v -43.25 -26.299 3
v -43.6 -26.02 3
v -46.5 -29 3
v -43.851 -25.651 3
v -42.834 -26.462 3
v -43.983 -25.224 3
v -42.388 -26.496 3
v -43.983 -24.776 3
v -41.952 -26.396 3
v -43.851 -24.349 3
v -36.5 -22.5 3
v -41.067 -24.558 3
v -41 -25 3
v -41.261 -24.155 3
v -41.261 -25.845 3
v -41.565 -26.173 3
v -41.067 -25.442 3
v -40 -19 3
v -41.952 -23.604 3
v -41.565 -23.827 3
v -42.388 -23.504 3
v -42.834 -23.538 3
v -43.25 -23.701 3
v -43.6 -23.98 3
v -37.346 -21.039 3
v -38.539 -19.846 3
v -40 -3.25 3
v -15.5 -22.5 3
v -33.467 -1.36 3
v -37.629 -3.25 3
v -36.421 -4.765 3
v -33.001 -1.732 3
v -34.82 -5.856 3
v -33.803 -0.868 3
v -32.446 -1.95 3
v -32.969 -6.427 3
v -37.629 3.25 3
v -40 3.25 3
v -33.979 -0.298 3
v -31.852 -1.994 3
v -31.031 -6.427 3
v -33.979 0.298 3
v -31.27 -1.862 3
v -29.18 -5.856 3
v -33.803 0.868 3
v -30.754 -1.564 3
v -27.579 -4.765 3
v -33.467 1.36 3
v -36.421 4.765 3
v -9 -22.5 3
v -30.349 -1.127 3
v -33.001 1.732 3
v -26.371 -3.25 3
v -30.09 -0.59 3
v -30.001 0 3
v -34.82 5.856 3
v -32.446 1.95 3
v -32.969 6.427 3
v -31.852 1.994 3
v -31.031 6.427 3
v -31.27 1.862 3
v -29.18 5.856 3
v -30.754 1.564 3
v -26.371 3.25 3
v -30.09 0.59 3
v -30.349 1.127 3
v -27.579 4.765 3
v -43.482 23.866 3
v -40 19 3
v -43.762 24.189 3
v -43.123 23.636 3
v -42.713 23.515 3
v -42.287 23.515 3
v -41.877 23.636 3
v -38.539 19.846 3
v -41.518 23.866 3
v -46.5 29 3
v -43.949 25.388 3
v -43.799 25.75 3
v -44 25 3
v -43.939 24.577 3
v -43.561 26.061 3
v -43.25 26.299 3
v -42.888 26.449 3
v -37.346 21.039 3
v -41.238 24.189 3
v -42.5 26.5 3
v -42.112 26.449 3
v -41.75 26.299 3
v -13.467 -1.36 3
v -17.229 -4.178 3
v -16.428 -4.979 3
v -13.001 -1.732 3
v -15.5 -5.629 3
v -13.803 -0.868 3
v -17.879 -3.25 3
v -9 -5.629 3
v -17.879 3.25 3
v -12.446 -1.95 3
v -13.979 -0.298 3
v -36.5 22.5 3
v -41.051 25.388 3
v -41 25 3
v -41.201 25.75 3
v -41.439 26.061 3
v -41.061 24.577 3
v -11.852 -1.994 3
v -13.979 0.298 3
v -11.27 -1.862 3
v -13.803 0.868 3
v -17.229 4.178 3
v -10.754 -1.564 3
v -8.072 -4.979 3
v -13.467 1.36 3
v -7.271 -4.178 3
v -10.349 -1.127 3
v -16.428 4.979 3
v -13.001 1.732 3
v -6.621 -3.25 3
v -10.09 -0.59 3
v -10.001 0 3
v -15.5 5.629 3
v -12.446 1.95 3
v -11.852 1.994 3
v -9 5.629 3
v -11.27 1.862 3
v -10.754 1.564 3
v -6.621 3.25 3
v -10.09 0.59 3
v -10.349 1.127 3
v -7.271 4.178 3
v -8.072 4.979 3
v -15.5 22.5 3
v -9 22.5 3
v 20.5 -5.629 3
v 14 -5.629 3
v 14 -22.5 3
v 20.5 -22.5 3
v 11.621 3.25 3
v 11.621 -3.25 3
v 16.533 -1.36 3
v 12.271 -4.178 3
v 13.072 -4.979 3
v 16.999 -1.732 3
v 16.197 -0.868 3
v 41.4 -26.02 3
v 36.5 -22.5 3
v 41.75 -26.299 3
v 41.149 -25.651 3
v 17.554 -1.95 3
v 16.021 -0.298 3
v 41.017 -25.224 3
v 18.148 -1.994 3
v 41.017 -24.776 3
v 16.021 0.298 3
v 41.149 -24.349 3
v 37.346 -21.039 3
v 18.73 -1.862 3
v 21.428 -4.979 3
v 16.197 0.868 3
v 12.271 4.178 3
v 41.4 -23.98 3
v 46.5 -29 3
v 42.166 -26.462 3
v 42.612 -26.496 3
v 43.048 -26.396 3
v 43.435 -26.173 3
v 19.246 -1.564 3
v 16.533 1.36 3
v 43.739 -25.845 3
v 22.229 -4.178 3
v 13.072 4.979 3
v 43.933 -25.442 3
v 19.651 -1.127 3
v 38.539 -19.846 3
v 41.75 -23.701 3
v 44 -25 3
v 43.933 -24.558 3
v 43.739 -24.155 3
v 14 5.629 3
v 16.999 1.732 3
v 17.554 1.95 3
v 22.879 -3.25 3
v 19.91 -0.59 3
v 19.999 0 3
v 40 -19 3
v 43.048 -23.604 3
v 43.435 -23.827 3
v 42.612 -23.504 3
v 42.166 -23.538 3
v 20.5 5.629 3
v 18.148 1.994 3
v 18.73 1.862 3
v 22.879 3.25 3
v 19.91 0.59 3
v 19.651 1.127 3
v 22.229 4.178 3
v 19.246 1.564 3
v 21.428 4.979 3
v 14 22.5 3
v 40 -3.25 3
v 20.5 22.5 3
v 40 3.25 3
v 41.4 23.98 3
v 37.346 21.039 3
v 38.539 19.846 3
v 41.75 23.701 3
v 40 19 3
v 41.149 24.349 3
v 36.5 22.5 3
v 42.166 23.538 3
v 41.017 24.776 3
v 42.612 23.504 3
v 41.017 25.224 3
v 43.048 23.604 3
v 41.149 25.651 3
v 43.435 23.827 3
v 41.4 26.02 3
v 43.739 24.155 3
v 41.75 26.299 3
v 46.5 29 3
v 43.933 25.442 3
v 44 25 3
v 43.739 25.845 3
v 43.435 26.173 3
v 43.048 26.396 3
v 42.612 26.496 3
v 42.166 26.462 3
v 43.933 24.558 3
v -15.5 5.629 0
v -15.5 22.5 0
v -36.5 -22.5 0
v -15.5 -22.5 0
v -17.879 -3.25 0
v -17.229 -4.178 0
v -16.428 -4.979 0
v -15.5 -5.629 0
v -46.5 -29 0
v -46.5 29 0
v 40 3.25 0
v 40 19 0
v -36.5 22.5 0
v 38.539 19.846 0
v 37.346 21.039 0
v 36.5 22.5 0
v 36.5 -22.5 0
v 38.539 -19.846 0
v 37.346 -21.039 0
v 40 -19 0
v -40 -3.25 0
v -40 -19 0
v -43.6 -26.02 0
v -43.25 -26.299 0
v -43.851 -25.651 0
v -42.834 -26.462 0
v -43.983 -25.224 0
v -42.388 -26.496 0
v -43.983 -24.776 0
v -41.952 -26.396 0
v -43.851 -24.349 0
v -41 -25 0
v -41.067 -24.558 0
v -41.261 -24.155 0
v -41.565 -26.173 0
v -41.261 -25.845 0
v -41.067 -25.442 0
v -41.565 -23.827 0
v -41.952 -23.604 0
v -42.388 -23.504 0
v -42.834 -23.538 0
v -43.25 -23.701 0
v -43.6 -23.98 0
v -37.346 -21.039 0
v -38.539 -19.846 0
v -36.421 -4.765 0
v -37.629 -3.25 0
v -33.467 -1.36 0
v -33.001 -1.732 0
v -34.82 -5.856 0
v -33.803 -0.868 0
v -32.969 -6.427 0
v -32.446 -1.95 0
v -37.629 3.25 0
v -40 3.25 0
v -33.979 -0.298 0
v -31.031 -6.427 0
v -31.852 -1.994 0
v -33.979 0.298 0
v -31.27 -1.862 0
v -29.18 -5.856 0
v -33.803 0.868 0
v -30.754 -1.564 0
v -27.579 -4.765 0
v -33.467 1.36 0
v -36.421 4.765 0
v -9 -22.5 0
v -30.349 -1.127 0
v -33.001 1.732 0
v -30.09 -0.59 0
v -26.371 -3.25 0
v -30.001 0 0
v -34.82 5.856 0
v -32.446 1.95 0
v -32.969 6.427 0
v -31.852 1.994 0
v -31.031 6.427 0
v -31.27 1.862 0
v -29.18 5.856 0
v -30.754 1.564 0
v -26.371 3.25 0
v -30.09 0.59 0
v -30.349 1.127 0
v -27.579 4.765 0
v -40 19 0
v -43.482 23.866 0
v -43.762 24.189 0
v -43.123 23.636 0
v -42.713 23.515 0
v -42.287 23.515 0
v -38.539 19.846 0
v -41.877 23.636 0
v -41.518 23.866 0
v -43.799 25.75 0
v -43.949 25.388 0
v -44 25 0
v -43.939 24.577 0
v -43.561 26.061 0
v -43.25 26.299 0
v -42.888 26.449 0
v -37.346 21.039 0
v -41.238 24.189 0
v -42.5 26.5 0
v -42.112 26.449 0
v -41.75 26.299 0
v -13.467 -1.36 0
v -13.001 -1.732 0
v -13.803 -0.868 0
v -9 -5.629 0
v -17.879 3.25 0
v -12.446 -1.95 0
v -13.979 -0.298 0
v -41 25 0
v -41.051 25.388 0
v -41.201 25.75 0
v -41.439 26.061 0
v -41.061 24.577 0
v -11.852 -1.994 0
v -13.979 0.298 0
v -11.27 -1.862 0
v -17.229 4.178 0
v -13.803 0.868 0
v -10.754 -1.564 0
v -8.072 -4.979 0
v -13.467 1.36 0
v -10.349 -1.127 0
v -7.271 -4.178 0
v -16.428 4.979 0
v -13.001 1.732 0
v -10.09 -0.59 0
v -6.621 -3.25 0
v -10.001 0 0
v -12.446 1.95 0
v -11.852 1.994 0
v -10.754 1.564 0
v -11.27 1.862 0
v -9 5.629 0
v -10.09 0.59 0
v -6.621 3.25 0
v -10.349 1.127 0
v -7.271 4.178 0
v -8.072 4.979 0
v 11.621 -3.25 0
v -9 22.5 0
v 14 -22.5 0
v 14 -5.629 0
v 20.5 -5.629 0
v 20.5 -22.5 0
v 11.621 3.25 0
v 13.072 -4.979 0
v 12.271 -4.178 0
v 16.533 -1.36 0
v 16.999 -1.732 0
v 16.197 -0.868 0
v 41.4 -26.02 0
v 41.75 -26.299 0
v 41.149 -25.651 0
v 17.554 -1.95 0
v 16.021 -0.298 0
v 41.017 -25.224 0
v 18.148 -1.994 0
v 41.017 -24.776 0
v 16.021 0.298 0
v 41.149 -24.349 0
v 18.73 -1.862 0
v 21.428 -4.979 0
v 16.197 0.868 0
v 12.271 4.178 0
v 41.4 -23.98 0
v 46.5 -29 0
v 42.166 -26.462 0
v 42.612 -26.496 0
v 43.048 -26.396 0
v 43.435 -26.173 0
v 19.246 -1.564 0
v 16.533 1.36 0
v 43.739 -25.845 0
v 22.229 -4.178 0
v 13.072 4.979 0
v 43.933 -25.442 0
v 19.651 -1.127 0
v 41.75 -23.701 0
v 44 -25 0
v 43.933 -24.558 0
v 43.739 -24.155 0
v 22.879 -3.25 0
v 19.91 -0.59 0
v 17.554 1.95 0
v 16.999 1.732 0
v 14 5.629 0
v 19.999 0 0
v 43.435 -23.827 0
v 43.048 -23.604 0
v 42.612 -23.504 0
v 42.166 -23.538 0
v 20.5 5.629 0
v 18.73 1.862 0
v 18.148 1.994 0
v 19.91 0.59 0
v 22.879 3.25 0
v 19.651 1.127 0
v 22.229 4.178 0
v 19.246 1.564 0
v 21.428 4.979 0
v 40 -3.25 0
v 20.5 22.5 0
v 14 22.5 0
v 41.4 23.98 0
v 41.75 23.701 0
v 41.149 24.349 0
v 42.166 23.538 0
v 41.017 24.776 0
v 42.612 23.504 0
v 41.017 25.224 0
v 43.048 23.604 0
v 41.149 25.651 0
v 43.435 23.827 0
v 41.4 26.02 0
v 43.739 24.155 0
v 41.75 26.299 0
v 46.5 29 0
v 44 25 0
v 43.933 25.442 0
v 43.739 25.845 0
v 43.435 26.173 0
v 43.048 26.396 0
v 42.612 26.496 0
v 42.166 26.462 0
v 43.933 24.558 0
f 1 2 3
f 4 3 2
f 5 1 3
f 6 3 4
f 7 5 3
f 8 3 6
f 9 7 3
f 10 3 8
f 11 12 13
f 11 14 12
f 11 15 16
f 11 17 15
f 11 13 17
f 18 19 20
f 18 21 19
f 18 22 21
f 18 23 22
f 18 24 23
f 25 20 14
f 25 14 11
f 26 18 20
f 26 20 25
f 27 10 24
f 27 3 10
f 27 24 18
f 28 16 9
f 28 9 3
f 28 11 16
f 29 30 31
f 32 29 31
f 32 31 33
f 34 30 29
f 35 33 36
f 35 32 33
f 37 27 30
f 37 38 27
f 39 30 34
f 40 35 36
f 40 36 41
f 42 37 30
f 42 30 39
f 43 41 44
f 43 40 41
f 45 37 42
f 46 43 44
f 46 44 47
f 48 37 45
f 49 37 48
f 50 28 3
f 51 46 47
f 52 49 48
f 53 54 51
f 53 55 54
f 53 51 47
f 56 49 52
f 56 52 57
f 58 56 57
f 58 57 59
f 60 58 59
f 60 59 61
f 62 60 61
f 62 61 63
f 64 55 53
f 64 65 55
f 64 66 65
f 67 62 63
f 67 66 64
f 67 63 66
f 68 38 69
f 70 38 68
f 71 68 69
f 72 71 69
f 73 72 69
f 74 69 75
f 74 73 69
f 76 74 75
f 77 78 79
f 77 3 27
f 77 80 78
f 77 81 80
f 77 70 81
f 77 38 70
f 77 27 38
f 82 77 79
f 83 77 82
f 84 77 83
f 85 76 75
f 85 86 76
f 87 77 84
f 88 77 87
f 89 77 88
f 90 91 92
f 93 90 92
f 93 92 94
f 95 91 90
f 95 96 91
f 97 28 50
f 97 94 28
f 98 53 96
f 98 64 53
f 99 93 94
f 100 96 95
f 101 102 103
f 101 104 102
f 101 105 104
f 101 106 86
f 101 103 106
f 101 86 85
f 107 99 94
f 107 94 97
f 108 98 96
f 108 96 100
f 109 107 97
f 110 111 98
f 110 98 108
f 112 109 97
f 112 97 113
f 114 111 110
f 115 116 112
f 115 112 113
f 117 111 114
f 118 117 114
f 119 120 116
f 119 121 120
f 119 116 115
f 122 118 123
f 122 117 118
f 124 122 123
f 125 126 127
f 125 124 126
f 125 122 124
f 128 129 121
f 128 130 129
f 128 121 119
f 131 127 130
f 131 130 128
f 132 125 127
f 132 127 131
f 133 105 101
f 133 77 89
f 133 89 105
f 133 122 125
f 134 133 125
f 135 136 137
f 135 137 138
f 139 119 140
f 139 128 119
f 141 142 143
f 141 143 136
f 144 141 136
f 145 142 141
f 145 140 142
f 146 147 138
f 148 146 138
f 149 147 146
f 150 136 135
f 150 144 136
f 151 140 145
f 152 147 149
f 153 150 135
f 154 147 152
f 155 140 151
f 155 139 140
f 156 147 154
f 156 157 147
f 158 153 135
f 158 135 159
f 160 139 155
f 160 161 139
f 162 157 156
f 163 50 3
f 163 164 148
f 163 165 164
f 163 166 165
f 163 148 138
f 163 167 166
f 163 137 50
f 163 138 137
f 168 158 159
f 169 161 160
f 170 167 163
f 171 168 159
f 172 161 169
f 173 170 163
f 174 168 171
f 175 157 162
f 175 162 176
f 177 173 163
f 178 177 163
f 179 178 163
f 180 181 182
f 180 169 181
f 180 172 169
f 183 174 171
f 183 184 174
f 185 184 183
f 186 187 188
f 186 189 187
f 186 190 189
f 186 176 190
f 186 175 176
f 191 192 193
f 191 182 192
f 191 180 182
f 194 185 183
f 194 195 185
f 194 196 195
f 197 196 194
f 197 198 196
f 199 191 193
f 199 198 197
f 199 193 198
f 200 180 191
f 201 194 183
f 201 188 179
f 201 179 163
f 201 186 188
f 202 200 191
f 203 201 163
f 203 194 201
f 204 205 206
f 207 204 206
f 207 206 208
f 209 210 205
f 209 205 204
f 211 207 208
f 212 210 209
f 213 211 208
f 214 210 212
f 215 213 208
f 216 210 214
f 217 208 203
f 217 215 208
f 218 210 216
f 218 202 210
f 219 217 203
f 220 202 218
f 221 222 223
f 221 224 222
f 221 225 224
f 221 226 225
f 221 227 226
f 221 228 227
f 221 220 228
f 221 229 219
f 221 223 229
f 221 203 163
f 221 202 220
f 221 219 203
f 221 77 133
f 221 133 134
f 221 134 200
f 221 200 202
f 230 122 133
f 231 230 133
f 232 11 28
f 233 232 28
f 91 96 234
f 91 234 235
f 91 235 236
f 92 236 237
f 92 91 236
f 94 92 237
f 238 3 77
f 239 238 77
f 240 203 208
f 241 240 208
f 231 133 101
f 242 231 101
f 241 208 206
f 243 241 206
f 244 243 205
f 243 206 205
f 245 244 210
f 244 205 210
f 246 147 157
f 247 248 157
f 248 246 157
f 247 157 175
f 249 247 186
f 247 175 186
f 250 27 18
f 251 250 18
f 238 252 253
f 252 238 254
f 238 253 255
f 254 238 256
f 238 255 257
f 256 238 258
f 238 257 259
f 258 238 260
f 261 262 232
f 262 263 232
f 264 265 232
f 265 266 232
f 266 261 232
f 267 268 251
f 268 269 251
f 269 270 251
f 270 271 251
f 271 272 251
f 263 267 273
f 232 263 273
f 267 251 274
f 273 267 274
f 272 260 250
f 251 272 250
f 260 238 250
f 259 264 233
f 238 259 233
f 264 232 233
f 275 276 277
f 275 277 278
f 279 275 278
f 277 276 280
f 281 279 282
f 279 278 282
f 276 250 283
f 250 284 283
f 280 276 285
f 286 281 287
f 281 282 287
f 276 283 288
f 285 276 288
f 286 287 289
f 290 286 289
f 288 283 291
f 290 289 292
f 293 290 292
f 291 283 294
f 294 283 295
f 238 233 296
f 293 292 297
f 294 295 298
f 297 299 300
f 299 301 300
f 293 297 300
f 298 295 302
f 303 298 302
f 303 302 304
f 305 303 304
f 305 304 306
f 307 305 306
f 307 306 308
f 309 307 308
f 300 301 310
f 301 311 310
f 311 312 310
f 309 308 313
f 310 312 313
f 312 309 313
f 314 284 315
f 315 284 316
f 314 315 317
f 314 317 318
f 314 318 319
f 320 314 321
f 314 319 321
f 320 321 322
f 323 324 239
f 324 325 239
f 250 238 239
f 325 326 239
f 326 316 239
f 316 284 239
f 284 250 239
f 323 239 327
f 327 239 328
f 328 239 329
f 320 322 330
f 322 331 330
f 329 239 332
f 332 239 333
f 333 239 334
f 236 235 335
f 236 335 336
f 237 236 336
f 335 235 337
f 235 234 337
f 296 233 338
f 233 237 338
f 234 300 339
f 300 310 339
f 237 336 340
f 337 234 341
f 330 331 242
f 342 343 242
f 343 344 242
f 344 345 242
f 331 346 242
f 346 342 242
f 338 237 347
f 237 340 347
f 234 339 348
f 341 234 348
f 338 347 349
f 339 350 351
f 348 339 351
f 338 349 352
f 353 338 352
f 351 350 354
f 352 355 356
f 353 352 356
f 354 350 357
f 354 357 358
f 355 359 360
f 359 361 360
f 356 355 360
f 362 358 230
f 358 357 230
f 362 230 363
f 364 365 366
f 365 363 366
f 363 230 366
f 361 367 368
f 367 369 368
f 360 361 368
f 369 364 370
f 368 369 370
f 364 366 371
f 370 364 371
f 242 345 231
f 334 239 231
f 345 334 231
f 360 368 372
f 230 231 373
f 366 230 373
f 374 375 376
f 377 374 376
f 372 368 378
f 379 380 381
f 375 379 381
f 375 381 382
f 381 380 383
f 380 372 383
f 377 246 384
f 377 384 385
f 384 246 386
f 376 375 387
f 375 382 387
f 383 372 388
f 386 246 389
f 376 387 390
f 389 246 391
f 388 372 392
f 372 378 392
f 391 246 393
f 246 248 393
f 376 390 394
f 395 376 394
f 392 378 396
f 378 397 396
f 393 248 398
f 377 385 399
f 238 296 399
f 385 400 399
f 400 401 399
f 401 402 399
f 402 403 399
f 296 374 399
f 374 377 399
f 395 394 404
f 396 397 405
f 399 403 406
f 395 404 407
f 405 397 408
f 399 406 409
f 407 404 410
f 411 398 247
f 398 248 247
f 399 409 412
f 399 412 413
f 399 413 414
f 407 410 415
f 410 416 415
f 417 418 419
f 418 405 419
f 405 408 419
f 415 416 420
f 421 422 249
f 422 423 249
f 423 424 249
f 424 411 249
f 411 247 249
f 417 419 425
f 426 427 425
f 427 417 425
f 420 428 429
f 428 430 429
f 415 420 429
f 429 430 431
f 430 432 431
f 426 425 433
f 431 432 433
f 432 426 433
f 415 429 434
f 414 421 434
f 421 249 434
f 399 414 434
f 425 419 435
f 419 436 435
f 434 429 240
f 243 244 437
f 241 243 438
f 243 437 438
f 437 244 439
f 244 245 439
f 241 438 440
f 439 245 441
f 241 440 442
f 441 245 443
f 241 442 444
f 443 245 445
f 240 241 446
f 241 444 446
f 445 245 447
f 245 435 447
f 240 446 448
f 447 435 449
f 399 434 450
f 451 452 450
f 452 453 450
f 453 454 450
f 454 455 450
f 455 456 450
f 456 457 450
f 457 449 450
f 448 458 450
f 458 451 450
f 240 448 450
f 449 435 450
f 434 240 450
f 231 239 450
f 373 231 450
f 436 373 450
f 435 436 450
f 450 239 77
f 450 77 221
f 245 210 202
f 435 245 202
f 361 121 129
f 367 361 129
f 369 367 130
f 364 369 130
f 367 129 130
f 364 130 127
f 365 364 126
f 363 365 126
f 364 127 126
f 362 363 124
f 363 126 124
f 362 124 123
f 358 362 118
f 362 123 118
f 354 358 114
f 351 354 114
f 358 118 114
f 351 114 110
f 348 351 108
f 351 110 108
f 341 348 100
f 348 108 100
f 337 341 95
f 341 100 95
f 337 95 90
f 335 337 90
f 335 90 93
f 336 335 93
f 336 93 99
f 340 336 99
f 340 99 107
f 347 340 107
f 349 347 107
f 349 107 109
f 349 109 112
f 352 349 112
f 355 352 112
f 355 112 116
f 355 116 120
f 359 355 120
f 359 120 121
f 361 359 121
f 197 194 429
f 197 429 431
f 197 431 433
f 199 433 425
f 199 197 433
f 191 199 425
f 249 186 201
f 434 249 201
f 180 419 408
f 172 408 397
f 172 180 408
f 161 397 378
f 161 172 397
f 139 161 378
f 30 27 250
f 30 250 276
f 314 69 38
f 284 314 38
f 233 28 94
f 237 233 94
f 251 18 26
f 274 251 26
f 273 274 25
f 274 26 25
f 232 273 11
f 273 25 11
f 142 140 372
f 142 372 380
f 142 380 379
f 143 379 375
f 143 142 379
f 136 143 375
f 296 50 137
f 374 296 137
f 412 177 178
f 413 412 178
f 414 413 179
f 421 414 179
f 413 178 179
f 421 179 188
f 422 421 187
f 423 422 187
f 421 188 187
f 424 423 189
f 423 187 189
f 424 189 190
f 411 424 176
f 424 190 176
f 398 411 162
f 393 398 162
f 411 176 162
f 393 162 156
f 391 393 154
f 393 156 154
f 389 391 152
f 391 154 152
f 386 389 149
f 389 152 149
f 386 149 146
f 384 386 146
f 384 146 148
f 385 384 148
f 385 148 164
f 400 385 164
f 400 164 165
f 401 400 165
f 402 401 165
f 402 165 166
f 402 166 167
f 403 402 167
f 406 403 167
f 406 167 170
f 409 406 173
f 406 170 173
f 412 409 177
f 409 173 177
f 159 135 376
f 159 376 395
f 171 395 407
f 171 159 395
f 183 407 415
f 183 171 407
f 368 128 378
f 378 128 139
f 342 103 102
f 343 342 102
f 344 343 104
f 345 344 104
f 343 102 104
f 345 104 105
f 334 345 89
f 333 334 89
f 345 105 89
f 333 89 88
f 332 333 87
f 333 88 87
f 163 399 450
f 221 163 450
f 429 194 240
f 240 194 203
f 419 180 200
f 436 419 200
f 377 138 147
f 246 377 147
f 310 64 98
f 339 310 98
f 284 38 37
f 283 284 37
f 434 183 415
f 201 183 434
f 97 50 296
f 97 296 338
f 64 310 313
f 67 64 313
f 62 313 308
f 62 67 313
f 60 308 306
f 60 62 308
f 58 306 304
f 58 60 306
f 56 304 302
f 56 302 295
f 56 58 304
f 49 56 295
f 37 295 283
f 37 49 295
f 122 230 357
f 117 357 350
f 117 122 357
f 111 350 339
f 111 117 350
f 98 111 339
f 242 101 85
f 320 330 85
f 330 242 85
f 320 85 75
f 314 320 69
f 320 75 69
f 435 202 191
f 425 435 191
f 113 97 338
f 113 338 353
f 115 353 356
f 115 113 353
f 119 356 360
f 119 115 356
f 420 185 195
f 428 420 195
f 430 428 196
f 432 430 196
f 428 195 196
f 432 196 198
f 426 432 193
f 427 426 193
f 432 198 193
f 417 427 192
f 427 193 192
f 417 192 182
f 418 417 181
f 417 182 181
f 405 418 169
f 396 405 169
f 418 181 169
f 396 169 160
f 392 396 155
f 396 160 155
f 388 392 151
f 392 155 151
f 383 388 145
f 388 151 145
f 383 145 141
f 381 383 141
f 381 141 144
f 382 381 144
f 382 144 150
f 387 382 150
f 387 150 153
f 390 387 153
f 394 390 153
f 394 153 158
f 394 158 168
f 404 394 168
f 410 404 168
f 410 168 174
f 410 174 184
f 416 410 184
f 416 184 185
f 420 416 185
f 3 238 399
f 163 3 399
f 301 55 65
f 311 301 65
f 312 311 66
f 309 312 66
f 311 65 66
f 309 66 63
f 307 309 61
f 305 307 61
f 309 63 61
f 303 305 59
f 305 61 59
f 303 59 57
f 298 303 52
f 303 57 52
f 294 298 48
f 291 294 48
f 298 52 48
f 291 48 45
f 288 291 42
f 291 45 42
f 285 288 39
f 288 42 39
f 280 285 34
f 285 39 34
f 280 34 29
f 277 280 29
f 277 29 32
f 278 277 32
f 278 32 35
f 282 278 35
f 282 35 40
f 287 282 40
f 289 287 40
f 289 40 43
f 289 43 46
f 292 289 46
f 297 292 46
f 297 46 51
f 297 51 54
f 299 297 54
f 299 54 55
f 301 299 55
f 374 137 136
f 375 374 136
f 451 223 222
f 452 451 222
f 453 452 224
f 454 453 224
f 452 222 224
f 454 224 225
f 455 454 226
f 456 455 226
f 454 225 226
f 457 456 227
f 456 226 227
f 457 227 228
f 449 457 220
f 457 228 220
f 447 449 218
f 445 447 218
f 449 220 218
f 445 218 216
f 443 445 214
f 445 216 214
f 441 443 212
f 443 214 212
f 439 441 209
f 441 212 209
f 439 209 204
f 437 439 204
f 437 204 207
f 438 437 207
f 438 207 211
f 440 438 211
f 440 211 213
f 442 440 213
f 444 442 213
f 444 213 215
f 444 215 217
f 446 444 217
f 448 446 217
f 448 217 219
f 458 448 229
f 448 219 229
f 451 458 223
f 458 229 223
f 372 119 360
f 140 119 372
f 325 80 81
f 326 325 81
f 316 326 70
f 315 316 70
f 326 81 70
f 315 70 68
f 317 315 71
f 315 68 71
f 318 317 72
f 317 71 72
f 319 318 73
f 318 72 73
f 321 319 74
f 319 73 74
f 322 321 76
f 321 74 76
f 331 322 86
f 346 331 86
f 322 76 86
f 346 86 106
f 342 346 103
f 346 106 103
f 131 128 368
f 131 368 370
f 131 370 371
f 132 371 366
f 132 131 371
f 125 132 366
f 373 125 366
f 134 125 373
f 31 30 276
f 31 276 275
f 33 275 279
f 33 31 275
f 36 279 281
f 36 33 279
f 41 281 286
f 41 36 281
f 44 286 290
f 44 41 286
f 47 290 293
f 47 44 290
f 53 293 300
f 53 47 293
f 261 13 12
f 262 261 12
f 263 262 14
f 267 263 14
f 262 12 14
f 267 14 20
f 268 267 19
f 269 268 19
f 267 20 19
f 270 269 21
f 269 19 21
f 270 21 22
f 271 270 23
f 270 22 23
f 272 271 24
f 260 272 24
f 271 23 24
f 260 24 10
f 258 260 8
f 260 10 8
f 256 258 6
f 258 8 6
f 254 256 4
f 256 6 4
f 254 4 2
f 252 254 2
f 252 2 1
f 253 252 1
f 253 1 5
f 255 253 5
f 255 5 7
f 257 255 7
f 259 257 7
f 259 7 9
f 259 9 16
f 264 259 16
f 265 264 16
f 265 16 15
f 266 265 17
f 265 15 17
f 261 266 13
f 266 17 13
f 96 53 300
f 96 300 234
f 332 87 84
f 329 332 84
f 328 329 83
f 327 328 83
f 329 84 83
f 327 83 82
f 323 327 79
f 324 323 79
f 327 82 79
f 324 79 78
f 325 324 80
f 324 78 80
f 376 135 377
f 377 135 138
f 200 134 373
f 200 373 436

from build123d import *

# Parameters (mm, degrees)
SKETCH1_W               = 93
SKETCH1_H               = 58
BOSS_EXTRUDE1_DEPTH     = 3
SKETCH2_R               = 1.5
CUT_EXTRUDE2_DEPTH      = 3
CUT_EXTRUDE3_DEPTH      = 10
CUT_EXTRUDE3_DEPTH_BACK = 10
SKETCH6_W               = 23
SKETCH6_H               = 45
CUT_EXTRUDE4_DEPTH      = 10
SKETCH7_W               = 93
SKETCH7_H               = 6.5
BOSS_EXTRUDE2_DEPTH     = 3
SKETCH8_R               = 6.5
SKETCH8_W               = 6.5
SKETCH8_H               = 6.5
BOSS_EXTRUDE3_DEPTH     = 3
SKETCH9_R               = 2
CUT_EXTRUDE6_DEPTH      = 4
SKETCH12_R              = 6.5
SKETCH12_R_2            = 2
BOSS_EXTRUDE5_DEPTH     = 3
SKETCH14_R              = 2
CUT_EXTRUDE7_DEPTH      = 10


with BuildPart() as part:
    # Sketch1 → Boss-Extrude1 (new body)
    with BuildSketch(Plane.XY):
        Rectangle(SKETCH1_W, SKETCH1_H)
    extrude(amount=BOSS_EXTRUDE1_DEPTH)

    # Sketch2 → Cut-Extrude2 (cut)
    with BuildSketch(Plane.XY.offset(3)):
        with BuildLine():
            ThreePointArc((-42.5, 26.5), (-43.560660172, 26.060660172), (-44, 25))
            Line((-44, 25), (-42.5, 25))
            Line((-42.5, 25), (-42.5, 26.5))
        make_face()
        with BuildLine():
            Line((-42.5, 25), (-44, 25))
            ThreePointArc((-44, 25), (-42.5, 23.5), (-41, 25))
            ThreePointArc((-41, 25), (-41.439339828, 26.060660172), (-42.5, 26.5))
            Line((-42.5, 26.5), (-42.5, 25))
        make_face()
        with Locations((-42.5, -25)):
            Circle(SKETCH2_R)
        with Locations((42.5, -25)):
            Circle(SKETCH2_R)
        with Locations((42.5, 25)):
            Circle(SKETCH2_R)
    extrude(amount=-CUT_EXTRUDE2_DEPTH, mode=Mode.SUBTRACT)

    # Sketch5 → Cut-Extrude3 (cut, two sides)
    with BuildSketch(Plane.XY.offset(3)) as cut_extrude3_sk:
        with BuildLine():
            ThreePointArc((-36.5, 22.5), (-37.903805922, 20.403805922), (-40, 19))
            Line((-40, 19), (-40, -19))
            ThreePointArc((-40, -19), (-37.903805922, -20.403805922), (-36.5, -22.5))
            Line((-36.5, -22.5), (-15.5, -22.5))
            Line((-15.5, -22.5), (-15.5, 22.5))
            Line((-15.5, 22.5), (-36.5, 22.5))
        make_face()
        with BuildLine():
            Line((20.5, -22.5), (36.5, -22.5))
            ThreePointArc((36.5, -22.5), (37.903805922, -20.403805922), (40, -19))
            Line((40, -19), (40, 19))
            ThreePointArc((40, 19), (37.903805922, 20.403805922), (36.5, 22.5))
            Line((36.5, 22.5), (20.5, 22.5))
            Line((20.5, 22.5), (20.5, -22.5))
        make_face()
    extrude(amount=CUT_EXTRUDE3_DEPTH, mode=Mode.SUBTRACT)
    extrude(cut_extrude3_sk.sketch, amount=-CUT_EXTRUDE3_DEPTH_BACK, mode=Mode.SUBTRACT)

    # Sketch6 → Cut-Extrude4 (cut)
    with BuildSketch(Plane.XY.offset(3)):
        with Locations((2.5, 0)):
            Rectangle(SKETCH6_W, SKETCH6_H)
    extrude(amount=-CUT_EXTRUDE4_DEPTH, mode=Mode.SUBTRACT)

    # Sketch7 → Boss-Extrude2 (add, through all)
    with BuildSketch(Plane.XY.offset(3)):
        Rectangle(SKETCH7_W, SKETCH7_H)
    extrude(amount=-BOSS_EXTRUDE2_DEPTH)

    # Sketch8 → Boss-Extrude3 (add, through all)
    with BuildSketch(Plane.XY.offset(3)):
        with Locations((-12.25, 0)):
            Circle(SKETCH8_R)
        with Locations((-12.25, 0)):
            Rectangle(SKETCH8_W, SKETCH8_H, mode=Mode.SUBTRACT)
        with Locations((17.25, 0)):
            Circle(SKETCH8_R)
        with Locations((17.25, 0)):
            Rectangle(SKETCH8_W, SKETCH8_H, mode=Mode.SUBTRACT)
    extrude(amount=-BOSS_EXTRUDE3_DEPTH)

    # Sketch9 → Cut-Extrude6 (cut, through all)
    with BuildSketch(Plane.XY.offset(3)):
        with Locations((-12.000998453, 0)):
            Circle(SKETCH9_R)
        with Locations((17.999001547, 0)):
            Circle(SKETCH9_R)
    extrude(amount=-CUT_EXTRUDE6_DEPTH, mode=Mode.SUBTRACT)

    # Sketch12 → Boss-Extrude5 (add, through all)
    with BuildSketch(Plane.XY.offset(3)):
        with Locations((-32, 0)):
            Circle(SKETCH12_R)
        with Locations((-32, 0)):
            Circle(SKETCH12_R_2, mode=Mode.SUBTRACT)
    extrude(amount=-BOSS_EXTRUDE5_DEPTH)

    # Sketch14 → Cut-Extrude7 (cut)
    with BuildSketch(Plane.XY.offset(3)):
        with Locations((-32.000998453, 0)):
            Circle(SKETCH14_R)
    extrude(amount=-CUT_EXTRUDE7_DEPTH, mode=Mode.SUBTRACT)


solid = part.part
